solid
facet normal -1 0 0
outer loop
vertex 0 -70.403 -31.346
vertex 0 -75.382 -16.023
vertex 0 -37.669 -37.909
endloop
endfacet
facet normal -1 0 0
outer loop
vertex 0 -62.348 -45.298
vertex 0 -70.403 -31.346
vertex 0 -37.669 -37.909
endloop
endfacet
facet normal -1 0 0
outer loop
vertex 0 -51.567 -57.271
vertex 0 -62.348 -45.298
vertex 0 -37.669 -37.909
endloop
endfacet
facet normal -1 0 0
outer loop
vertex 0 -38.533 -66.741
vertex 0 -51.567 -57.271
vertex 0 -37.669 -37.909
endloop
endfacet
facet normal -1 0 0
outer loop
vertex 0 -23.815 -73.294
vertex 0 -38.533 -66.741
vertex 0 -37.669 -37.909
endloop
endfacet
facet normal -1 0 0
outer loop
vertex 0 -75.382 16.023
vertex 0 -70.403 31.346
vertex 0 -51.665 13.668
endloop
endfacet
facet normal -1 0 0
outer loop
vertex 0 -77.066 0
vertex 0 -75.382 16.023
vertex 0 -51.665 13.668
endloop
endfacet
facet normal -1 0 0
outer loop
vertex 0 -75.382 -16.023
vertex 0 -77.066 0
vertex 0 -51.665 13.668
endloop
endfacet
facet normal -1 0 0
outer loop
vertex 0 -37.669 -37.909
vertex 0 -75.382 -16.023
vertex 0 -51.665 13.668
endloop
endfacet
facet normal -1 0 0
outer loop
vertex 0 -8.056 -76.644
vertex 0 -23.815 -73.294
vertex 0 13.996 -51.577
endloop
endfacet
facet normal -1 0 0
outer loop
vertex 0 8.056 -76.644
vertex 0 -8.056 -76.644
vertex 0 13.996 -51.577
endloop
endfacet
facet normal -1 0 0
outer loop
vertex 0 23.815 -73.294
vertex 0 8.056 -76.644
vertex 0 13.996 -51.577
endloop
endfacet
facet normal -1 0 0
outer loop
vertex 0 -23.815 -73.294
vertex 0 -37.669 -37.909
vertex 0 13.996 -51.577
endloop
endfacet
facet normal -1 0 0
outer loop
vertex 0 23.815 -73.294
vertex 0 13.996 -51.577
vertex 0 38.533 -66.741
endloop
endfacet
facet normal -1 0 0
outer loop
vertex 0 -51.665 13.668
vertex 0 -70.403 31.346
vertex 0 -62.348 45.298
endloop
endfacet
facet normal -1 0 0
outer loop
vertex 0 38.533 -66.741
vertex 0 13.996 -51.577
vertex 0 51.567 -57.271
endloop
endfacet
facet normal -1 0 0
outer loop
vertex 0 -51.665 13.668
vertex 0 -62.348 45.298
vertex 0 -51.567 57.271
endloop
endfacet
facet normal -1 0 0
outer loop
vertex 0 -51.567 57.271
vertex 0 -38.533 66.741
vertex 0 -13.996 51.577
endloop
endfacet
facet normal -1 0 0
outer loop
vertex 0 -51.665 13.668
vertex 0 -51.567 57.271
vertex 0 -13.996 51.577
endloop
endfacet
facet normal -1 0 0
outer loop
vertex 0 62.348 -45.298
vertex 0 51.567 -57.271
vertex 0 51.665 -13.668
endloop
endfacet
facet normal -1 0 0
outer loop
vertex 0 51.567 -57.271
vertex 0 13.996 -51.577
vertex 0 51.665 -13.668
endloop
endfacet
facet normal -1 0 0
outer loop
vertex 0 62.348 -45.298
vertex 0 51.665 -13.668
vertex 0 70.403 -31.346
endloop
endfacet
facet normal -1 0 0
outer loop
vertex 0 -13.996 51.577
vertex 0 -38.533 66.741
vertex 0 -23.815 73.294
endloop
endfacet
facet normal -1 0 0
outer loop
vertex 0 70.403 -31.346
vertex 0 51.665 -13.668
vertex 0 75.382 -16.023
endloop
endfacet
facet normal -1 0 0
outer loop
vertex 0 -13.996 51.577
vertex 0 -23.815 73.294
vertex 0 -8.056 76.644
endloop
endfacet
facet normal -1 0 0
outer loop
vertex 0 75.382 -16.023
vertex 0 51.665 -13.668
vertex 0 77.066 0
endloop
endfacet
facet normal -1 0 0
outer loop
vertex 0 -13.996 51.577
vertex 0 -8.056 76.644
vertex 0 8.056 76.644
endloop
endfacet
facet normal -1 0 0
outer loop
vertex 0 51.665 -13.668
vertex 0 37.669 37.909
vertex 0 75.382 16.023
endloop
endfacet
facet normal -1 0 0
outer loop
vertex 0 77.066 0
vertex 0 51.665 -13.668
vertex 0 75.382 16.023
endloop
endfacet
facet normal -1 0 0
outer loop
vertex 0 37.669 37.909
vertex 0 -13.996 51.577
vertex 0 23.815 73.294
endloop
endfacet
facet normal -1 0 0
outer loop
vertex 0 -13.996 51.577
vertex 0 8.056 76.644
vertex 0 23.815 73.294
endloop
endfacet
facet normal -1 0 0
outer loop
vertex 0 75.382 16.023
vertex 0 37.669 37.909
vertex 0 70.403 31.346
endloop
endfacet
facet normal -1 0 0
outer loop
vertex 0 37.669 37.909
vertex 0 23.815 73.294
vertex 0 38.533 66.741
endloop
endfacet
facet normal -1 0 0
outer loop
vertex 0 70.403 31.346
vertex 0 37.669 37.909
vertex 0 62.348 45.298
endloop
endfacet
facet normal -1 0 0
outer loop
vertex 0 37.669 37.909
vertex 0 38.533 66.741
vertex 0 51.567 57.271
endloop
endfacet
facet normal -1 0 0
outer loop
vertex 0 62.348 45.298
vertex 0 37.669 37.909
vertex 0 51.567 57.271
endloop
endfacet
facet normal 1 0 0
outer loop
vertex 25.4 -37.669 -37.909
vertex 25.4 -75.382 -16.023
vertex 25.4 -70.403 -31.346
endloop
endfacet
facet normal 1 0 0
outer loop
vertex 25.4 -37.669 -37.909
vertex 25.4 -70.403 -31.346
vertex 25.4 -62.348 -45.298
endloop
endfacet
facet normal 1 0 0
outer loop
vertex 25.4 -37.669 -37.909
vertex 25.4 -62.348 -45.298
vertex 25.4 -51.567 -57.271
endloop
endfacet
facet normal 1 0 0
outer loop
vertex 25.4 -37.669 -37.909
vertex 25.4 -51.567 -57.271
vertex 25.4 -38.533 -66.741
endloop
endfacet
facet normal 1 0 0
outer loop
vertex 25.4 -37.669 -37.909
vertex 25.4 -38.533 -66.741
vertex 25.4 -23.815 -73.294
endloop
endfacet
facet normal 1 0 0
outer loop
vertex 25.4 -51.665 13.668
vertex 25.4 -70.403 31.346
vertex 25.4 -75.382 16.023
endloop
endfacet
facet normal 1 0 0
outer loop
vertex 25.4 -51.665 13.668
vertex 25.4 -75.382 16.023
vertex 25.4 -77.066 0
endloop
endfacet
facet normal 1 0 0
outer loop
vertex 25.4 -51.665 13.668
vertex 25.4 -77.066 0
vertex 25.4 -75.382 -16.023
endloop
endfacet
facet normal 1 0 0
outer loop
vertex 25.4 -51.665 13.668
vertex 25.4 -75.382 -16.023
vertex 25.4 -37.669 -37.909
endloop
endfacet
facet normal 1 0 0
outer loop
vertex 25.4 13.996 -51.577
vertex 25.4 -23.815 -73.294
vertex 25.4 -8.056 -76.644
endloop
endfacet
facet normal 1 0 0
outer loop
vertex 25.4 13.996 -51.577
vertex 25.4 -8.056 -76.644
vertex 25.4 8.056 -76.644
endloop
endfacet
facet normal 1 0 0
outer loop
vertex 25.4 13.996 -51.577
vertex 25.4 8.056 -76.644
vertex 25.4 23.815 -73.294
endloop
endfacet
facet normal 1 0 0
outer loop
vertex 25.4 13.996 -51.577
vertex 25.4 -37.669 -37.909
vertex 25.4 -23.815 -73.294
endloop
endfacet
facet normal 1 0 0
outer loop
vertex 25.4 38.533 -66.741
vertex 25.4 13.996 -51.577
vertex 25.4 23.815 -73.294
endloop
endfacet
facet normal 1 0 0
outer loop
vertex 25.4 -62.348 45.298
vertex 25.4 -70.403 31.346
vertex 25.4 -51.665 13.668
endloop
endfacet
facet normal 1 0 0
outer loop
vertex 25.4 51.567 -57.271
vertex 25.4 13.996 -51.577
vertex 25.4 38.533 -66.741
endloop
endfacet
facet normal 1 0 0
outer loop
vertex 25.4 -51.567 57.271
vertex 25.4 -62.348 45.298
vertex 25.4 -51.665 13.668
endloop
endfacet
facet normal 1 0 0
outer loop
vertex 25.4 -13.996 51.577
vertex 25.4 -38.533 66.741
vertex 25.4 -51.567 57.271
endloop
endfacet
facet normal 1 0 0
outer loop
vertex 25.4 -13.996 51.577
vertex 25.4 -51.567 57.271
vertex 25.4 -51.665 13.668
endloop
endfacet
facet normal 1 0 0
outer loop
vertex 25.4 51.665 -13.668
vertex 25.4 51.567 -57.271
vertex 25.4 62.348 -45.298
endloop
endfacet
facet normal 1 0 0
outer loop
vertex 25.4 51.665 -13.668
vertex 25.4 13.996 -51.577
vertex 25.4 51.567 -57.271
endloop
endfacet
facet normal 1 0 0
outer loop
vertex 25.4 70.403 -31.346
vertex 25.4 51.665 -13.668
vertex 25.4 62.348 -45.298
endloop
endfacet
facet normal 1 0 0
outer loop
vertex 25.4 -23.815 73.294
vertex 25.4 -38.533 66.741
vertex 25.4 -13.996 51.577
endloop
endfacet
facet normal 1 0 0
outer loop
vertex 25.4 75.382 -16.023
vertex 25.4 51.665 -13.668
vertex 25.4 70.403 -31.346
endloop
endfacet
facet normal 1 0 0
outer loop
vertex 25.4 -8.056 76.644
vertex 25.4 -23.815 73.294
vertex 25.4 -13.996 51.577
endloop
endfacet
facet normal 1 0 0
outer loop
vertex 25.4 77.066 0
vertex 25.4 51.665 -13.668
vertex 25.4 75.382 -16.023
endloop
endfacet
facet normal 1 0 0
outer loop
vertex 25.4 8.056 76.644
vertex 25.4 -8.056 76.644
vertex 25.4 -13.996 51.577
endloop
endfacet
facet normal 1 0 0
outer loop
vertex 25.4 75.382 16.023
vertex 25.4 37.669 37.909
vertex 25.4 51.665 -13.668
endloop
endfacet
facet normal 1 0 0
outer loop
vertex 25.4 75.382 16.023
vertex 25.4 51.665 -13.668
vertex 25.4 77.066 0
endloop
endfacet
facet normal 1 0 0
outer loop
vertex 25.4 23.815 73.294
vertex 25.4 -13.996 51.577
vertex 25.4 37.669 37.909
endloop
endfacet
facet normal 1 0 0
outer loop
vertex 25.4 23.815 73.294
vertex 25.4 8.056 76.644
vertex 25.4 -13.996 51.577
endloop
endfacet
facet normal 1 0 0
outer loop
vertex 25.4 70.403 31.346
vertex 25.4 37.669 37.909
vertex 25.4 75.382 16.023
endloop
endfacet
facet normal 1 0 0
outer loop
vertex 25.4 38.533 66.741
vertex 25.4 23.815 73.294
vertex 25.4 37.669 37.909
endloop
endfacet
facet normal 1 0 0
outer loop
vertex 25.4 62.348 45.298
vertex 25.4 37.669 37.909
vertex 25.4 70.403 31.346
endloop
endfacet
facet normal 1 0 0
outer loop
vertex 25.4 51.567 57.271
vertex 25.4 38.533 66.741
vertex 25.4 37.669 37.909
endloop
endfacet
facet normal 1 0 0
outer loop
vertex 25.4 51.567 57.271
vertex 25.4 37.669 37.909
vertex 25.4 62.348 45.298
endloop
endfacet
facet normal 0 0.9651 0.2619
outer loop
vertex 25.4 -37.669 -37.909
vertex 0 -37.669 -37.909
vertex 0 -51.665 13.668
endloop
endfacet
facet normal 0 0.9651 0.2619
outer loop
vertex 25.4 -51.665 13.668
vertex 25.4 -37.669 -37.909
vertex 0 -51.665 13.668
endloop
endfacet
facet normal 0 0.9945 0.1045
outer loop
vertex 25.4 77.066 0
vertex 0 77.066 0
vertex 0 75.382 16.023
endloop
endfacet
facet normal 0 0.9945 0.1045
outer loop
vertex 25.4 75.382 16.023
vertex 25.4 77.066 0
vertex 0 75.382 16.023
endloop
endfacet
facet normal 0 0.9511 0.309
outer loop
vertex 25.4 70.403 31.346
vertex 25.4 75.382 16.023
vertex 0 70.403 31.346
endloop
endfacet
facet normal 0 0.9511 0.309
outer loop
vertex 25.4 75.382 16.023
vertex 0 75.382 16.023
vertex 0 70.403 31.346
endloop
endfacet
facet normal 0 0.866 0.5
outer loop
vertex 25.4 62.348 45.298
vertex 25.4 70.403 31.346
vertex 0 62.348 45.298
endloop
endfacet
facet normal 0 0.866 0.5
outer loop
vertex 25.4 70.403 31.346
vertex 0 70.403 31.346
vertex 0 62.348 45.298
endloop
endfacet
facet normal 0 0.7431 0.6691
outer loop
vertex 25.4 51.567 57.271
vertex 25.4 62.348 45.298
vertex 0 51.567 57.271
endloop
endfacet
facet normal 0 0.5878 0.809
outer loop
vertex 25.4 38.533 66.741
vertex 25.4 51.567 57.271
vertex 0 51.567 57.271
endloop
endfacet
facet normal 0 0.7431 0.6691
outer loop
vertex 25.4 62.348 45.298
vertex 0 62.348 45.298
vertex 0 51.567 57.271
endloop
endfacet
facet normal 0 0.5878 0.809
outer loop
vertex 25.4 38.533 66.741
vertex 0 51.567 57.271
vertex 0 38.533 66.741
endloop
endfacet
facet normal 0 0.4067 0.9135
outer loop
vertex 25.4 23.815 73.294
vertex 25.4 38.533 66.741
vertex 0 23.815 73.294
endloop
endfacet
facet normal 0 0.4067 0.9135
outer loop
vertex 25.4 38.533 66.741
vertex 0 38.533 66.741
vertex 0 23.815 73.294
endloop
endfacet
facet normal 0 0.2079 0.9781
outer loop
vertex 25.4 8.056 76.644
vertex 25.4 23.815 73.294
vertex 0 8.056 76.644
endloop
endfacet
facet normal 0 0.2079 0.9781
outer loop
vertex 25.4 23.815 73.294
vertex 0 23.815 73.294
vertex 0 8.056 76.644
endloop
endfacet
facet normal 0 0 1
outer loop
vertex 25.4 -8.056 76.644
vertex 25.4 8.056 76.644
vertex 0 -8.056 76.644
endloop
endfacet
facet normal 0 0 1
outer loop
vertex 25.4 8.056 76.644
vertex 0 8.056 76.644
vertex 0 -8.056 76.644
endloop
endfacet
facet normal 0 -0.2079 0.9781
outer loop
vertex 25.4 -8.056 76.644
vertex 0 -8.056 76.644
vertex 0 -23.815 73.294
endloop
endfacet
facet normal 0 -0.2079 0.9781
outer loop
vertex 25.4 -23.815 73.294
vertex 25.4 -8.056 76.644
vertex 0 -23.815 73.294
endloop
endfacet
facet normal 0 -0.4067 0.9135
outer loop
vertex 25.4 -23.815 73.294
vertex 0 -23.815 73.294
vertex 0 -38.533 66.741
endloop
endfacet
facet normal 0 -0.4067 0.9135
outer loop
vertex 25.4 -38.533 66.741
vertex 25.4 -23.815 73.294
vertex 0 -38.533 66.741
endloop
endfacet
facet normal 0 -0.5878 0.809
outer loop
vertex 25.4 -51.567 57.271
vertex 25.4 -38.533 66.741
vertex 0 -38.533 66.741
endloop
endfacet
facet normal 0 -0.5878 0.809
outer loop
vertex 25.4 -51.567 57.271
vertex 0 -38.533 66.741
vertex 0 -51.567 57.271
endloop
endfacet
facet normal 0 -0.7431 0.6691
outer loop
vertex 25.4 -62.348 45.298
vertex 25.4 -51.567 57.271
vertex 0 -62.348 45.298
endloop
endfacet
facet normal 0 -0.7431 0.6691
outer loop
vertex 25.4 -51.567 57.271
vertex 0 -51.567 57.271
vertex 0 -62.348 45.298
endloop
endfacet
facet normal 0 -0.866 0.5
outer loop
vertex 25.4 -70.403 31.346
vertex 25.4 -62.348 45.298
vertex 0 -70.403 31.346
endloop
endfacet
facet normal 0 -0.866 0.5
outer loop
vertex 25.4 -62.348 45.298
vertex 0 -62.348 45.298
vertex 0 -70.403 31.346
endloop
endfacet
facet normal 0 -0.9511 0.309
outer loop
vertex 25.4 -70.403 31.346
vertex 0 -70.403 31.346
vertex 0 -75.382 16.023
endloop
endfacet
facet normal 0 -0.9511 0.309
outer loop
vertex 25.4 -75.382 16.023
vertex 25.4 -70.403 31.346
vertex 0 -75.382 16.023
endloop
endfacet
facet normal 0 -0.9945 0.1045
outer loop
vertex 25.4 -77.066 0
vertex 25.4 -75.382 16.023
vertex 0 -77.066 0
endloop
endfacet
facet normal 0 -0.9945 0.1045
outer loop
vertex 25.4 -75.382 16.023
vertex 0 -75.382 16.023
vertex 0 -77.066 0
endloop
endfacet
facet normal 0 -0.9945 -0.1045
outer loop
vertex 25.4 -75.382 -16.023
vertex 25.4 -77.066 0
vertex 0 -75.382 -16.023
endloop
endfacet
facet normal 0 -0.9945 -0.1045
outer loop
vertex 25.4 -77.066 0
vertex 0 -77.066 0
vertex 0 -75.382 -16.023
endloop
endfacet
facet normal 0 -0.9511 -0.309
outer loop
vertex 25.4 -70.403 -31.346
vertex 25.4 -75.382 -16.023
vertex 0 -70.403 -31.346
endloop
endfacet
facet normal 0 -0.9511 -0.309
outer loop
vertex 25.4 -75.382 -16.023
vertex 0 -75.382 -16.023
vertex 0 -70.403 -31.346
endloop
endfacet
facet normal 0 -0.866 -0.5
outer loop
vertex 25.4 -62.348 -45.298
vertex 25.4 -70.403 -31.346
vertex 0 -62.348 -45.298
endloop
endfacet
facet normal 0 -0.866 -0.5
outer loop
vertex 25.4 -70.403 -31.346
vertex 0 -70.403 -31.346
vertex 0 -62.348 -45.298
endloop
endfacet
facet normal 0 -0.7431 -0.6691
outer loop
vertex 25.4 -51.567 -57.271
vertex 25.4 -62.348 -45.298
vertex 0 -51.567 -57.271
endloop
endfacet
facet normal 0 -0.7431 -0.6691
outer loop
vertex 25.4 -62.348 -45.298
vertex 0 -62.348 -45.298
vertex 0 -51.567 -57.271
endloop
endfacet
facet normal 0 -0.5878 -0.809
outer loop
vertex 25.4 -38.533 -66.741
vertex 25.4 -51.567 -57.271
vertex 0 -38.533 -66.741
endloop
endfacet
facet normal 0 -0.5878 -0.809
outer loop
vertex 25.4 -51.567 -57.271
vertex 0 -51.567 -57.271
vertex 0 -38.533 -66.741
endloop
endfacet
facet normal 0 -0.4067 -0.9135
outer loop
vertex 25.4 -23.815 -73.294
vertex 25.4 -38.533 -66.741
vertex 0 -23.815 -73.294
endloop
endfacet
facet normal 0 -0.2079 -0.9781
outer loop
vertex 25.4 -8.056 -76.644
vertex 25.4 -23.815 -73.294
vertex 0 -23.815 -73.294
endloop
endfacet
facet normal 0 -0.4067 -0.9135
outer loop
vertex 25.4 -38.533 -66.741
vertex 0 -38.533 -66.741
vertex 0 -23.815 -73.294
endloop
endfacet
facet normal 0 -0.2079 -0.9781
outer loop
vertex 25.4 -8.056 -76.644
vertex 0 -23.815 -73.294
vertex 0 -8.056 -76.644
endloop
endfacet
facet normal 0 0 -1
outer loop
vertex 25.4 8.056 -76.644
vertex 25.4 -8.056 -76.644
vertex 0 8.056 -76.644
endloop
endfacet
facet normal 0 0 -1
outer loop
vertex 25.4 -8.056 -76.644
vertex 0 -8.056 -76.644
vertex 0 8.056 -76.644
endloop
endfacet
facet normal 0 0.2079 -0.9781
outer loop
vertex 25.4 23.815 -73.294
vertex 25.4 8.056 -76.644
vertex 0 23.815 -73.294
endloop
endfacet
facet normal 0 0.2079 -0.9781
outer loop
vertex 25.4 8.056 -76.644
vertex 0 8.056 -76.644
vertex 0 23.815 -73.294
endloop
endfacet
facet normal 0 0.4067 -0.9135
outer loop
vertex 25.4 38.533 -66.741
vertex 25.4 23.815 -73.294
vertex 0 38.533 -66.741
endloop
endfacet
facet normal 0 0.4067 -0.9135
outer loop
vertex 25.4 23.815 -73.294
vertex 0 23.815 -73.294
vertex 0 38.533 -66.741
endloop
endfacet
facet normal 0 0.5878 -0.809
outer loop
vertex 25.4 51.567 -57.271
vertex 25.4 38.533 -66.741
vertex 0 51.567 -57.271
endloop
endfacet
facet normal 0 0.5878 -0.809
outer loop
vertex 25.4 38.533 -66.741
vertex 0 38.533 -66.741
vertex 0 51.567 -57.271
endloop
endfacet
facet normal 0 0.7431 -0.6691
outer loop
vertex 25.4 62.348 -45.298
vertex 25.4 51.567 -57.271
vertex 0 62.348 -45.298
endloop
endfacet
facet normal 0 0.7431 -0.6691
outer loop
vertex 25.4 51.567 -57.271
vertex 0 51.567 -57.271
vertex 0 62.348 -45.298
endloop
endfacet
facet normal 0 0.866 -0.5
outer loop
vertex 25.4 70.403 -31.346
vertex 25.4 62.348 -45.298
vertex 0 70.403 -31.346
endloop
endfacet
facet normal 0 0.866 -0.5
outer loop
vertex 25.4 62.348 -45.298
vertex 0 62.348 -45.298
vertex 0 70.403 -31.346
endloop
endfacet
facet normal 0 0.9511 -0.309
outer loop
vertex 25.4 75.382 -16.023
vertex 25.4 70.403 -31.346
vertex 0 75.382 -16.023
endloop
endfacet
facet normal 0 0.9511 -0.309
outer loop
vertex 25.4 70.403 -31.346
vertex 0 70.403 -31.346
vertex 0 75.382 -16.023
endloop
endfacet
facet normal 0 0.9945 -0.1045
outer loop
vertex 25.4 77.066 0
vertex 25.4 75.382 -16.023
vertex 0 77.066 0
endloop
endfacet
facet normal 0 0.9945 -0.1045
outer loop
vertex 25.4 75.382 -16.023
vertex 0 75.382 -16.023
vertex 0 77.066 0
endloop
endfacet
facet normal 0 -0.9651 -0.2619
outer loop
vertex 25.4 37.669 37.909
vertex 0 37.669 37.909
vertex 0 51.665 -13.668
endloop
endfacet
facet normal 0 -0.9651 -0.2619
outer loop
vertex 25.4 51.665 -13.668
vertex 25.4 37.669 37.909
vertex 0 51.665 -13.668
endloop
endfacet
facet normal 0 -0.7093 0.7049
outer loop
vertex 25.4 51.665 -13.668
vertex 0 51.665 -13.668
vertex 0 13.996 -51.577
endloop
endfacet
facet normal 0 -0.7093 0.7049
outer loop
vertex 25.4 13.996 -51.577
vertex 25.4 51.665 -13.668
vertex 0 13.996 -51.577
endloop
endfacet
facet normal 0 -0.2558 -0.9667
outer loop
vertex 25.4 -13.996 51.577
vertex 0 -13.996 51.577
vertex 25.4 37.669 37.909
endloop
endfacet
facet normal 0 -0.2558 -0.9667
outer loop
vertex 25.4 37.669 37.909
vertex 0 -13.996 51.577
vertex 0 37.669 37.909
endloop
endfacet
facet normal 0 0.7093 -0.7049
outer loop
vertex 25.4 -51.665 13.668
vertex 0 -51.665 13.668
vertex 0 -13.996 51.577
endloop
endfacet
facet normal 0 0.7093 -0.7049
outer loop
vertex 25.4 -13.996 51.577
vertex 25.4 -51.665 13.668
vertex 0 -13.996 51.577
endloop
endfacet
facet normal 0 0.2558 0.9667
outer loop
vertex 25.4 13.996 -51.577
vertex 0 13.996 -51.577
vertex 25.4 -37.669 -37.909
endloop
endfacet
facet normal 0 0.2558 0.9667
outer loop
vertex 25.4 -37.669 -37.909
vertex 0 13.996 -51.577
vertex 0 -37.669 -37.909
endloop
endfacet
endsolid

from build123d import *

# Parameters (mm, degrees)
F0_R     = 77.066086
F1_DEPTH = 25.4
F3_DEPTH = 25.4


with BuildPart() as f1:
    # F0 (on Right) → F1 (new body)
    with BuildSketch(Plane.YZ):
        Circle(F0_R)
    extrude(amount=F1_DEPTH)

    # F2 (on face) → F3 (cut)
    with BuildSketch(Plane(origin=(0, 0, 0), x_dir=(0, -1, 0), z_dir=(-1, 0, 0))):
        Polygon((51.66469, 13.667783), (13.995698, 51.576825), (-37.668992, 37.909042), (-51.66469, -13.667783), (-13.995698, -51.576825), (37.668992, -37.909042), align=None)
    extrude(amount=-F3_DEPTH, mode=Mode.SUBTRACT)


solid = f1.part
